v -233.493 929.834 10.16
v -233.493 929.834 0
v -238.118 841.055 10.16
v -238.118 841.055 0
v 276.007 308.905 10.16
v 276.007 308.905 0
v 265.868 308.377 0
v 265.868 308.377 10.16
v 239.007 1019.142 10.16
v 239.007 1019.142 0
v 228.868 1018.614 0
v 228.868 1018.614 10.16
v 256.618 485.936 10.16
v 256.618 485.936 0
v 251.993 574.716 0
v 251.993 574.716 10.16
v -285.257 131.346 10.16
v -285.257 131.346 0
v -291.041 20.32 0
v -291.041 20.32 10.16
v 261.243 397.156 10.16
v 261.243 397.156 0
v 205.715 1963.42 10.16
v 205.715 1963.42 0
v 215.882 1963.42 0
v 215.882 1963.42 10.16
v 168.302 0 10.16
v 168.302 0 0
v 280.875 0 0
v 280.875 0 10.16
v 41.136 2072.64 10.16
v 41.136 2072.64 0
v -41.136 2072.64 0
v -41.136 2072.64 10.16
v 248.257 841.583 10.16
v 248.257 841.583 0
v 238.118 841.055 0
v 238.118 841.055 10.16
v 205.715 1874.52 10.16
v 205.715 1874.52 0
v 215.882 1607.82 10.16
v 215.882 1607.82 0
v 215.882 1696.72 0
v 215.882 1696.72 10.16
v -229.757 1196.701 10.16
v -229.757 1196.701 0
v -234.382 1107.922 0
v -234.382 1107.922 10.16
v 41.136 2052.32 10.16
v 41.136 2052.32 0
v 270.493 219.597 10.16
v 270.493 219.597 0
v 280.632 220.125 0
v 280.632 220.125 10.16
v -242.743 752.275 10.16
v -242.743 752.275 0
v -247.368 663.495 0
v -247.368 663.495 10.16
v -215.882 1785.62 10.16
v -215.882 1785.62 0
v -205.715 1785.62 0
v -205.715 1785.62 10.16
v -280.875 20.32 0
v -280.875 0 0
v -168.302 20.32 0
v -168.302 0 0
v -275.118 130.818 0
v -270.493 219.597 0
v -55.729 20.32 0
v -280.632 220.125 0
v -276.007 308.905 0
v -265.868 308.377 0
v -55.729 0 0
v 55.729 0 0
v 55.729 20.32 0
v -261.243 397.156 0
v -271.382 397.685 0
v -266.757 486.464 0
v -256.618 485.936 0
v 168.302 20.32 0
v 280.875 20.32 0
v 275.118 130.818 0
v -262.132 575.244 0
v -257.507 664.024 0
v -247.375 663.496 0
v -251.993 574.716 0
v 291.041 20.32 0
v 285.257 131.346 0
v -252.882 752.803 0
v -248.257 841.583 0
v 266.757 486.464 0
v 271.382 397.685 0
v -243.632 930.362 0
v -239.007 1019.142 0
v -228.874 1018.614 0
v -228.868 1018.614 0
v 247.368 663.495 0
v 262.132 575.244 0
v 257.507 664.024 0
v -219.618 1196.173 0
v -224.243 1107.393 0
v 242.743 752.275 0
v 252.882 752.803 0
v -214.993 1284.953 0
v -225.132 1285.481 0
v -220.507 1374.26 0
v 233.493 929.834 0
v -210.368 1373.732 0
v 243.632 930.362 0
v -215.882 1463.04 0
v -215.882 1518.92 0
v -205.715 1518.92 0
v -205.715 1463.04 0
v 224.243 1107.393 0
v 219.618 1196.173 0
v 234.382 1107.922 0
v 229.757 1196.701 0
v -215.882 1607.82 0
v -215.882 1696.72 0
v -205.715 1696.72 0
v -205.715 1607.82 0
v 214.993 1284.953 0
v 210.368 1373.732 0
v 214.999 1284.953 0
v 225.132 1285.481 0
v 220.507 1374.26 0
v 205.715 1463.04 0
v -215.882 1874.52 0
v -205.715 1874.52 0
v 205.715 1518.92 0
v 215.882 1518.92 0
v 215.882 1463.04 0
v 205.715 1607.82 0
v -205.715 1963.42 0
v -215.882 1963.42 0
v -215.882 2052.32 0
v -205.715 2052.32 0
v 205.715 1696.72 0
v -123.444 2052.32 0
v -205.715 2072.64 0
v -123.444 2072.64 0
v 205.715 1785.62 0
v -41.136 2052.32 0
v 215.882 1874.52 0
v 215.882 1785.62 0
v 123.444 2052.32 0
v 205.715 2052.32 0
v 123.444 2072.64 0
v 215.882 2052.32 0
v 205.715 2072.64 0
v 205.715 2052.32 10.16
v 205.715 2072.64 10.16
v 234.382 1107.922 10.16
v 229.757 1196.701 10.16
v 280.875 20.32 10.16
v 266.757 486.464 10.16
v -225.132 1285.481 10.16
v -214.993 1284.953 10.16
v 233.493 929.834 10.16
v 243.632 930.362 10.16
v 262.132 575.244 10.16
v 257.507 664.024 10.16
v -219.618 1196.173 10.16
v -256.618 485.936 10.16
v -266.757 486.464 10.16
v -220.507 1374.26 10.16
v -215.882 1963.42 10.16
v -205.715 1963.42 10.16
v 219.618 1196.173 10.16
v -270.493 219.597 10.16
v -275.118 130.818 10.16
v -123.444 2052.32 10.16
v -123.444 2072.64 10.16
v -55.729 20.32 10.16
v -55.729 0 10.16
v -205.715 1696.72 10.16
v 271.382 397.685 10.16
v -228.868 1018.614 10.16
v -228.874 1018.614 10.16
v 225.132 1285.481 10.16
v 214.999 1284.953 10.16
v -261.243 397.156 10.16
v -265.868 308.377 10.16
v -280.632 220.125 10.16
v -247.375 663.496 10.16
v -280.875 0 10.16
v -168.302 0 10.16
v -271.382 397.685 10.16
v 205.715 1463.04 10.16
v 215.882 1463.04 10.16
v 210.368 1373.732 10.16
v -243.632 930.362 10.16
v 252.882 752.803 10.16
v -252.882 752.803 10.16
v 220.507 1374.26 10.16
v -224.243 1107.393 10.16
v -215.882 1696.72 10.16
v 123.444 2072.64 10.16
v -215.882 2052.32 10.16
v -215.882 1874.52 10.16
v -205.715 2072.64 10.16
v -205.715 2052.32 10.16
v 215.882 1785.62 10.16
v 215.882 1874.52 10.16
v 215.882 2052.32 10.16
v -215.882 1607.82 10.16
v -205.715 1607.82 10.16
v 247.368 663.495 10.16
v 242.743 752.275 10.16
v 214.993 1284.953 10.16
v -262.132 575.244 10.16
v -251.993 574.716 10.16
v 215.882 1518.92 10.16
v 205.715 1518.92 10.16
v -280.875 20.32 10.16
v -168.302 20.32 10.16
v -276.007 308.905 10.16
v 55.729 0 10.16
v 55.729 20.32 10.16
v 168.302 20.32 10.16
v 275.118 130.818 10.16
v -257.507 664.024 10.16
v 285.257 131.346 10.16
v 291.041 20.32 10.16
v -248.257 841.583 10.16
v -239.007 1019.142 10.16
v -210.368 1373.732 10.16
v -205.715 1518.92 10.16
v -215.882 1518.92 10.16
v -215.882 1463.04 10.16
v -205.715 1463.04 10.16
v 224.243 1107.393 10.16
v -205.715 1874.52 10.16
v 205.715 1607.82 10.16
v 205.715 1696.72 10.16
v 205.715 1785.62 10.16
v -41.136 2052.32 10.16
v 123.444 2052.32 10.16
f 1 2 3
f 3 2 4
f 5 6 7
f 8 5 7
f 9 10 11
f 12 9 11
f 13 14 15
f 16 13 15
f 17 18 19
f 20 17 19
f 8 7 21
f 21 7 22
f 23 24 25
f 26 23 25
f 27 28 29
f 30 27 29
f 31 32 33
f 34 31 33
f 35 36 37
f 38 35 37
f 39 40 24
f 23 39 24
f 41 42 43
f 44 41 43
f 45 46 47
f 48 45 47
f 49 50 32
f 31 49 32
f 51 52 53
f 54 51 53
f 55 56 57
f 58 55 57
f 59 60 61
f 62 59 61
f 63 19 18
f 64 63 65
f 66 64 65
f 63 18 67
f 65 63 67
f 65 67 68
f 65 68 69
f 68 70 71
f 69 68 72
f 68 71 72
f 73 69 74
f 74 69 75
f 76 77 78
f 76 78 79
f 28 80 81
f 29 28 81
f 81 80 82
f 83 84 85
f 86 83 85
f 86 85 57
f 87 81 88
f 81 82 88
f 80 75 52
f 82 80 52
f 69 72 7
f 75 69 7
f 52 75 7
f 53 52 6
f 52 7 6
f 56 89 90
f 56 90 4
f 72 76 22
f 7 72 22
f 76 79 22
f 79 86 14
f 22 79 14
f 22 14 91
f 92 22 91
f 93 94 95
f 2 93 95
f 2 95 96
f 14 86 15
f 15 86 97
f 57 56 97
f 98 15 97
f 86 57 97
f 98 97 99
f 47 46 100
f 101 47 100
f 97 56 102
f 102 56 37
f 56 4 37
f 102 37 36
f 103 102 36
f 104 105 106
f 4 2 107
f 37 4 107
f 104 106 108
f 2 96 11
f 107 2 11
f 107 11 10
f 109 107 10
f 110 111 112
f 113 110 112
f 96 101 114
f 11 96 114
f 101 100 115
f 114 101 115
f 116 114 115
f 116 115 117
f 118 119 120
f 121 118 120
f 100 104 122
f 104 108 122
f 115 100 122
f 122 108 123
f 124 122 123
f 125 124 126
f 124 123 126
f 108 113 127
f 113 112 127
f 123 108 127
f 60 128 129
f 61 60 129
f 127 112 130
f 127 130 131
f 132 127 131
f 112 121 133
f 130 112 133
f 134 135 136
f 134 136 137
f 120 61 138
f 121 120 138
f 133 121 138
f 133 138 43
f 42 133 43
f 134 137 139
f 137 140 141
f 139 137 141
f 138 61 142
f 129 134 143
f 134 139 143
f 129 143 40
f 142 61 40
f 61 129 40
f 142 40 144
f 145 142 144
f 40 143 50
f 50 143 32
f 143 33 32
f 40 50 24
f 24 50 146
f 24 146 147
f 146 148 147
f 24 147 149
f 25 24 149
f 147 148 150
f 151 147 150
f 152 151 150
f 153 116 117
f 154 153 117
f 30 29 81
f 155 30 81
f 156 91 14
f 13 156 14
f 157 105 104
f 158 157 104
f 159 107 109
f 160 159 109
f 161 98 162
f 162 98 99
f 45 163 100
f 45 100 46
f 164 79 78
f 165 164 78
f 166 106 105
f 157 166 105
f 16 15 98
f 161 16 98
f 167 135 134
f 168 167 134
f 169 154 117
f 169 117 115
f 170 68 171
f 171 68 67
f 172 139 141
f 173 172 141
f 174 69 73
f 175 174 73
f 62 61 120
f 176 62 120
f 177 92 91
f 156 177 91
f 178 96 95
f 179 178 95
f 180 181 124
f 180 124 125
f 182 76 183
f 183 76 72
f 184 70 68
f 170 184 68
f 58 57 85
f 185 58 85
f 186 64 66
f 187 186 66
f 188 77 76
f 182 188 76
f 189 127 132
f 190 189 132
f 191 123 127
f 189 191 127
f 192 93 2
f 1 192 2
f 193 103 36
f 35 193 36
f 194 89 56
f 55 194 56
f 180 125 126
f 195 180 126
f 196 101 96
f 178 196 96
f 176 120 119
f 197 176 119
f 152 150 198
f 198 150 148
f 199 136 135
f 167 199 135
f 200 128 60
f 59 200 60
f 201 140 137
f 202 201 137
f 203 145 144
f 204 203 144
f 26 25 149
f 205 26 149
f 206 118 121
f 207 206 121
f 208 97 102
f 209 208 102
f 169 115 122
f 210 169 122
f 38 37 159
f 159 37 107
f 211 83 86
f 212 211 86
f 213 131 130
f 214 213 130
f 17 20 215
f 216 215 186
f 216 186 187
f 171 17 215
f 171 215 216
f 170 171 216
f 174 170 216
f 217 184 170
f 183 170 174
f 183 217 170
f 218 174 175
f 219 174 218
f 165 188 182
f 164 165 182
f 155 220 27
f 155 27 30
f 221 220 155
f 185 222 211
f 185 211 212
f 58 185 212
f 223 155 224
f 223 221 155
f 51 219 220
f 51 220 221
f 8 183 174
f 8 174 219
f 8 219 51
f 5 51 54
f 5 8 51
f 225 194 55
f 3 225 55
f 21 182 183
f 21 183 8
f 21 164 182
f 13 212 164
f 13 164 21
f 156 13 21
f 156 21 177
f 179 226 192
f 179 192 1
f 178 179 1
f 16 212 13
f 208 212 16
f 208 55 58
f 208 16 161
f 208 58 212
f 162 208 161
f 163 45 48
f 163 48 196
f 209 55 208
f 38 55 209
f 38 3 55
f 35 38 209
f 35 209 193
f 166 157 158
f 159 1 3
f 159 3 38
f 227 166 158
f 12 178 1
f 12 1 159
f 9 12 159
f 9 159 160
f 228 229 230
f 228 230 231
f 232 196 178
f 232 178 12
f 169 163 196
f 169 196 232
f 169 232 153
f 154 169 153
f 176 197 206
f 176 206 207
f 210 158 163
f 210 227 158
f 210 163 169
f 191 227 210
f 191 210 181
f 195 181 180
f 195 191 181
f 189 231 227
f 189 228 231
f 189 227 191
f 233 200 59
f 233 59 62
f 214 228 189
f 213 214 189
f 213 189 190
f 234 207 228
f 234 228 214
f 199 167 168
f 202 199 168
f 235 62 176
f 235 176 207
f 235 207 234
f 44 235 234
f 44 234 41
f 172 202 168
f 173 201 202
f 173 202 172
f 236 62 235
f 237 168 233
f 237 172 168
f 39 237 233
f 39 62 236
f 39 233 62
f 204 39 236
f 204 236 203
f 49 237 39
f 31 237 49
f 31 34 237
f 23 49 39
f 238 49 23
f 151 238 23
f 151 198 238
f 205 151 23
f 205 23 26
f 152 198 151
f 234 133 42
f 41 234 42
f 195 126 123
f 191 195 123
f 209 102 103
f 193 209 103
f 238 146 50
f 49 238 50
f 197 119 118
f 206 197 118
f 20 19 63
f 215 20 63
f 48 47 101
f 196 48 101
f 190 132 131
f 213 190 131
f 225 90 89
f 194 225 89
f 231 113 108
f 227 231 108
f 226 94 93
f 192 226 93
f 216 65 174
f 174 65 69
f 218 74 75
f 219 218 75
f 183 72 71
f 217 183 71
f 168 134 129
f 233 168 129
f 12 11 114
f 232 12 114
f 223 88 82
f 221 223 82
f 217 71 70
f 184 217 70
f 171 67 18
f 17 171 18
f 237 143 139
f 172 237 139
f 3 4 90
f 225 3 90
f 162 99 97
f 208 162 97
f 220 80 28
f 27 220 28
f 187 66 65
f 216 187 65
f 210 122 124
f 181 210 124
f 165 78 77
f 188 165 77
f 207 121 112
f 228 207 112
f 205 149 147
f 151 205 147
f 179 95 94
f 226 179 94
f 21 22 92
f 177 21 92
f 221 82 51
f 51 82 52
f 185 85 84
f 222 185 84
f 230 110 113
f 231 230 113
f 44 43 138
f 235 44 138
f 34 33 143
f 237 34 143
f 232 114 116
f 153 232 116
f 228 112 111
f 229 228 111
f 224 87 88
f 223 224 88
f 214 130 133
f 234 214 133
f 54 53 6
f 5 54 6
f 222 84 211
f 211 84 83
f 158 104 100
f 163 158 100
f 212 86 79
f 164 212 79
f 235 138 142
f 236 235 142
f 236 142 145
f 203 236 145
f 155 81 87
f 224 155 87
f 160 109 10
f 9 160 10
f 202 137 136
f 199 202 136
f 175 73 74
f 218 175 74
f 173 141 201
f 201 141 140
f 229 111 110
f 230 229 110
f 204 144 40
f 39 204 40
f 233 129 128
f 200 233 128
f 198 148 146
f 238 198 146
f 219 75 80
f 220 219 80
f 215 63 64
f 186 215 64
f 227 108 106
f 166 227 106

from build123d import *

# Parameters (mm, degrees)
BOSS_EXTRUDE3_DEPTH = 10.16


with BuildPart() as part:
    # Sketch4 → Boss-Extrude3 (new body)
    with BuildSketch(Plane.XY):
        Polygon((-210.367858706, 1373.732193279), (-220.506832234, 1374.260391019), (-225.131875264, 1285.480782003), (-214.992901736, 1284.952584263), (-219.617944766, 1196.172975248), (-229.756918293, 1196.701172988), (-234.381961323, 1107.921563972), (-224.242987795, 1107.393366232), (-228.868030825, 1018.613757216), (-228.874436508, 1018.614090925), (-239.007004353, 1019.141954956), (-243.632047383, 930.362345941), (-233.493073855, 929.834148201), (-238.118116884, 841.054539185), (-248.257090412, 841.582736925), (-252.882133442, 752.803127909), (-242.743159914, 752.274930169), (-247.368202944, 663.495321154), (-247.374608626, 663.495654863), (-257.507176472, 664.023518894), (-262.132219501, 575.243909878), (-251.993245973, 574.715712138), (-256.618289003, 485.936103122), (-266.757262531, 486.464300862), (-271.382305561, 397.684691847), (-261.243332033, 397.156494107), (-265.868375062, 308.376885091), (-276.00734859, 308.905082831), (-280.63239162, 220.125473815), (-270.493418092, 219.597276075), (-275.118461122, 130.81766706), (-285.25743465, 131.3458648), (-291.041413739, 20.32), (-280.874923338, 20.32), (-280.874923338, 0), (-168.302123338, 0), (-168.302123338, 20.32), (-55.729323338, 20.32), (-55.729323338, 0), (55.729323338, 0), (55.729323338, 20.32), (168.302123338, 20.32), (168.302123338, 0), (280.874923338, 0), (280.874923338, 20.32), (291.041413739, 20.32), (285.25743465, 131.3458648), (275.118461122, 130.81766706), (270.493418092, 219.597276075), (280.63239162, 220.125473815), (276.00734859, 308.905082831), (265.868375062, 308.376885091), (261.243332033, 397.156494107), (271.382305561, 397.684691847), (266.757262531, 486.464300862), (256.618289003, 485.936103122), (251.993245973, 574.715712138), (262.132219501, 575.243909878), (257.507176472, 664.023518894), (247.368202944, 663.495321154), (242.743159914, 752.274930169), (252.882133442, 752.803127909), (248.257090412, 841.582736925), (238.118116884, 841.054539185), (233.493073855, 929.834148201), (243.632047383, 930.362345941), (239.007004353, 1019.141954956), (228.868030825, 1018.613757216), (224.242987795, 1107.393366232), (234.381961323, 1107.921563972), (229.756918293, 1196.701172988), (219.617944766, 1196.172975248), (214.992901736, 1284.952584263), (214.999307419, 1284.952917972), (225.131875264, 1285.480782003), (220.506832234, 1374.260391019), (210.367858706, 1373.732193279), (205.715298803, 1463.040000035), (215.881789204, 1463.040000035), (215.881789204, 1518.92), (205.715298803, 1518.92), (205.715298803, 1607.82), (215.881789204, 1607.82), (215.881789204, 1696.72), (205.715298803, 1696.72), (205.715298803, 1785.62), (215.881789204, 1785.62), (215.881789204, 1874.52), (205.715298803, 1874.52), (205.715298803, 1963.42), (215.881789204, 1963.42), (215.881789204, 2052.32), (205.715298803, 2052.32), (205.715298803, 2072.64), (123.444, 2072.64), (123.444, 2052.32), (41.135649402, 2052.32), (41.135649402, 2072.64), (-41.135649402, 2072.64), (-41.135649402, 2052.32), (-123.444, 2052.32), (-123.444, 2072.64), (-205.715298803, 2072.64), (-205.715298803, 2052.32), (-215.881789204, 2052.32), (-215.881789204, 1963.42), (-205.715298803, 1963.42), (-205.715298803, 1874.52), (-215.881789204, 1874.52), (-215.881789204, 1785.62), (-205.715298803, 1785.62), (-205.715298803, 1696.72), (-215.881789204, 1696.72), (-215.881789204, 1607.82), (-205.715298803, 1607.82), (-205.715298803, 1518.92), (-215.881789204, 1518.92), (-215.881789204, 1463.040000035), (-205.715298803, 1463.040000035), align=None)
    extrude(amount=BOSS_EXTRUDE3_DEPTH)


solid = part.part
